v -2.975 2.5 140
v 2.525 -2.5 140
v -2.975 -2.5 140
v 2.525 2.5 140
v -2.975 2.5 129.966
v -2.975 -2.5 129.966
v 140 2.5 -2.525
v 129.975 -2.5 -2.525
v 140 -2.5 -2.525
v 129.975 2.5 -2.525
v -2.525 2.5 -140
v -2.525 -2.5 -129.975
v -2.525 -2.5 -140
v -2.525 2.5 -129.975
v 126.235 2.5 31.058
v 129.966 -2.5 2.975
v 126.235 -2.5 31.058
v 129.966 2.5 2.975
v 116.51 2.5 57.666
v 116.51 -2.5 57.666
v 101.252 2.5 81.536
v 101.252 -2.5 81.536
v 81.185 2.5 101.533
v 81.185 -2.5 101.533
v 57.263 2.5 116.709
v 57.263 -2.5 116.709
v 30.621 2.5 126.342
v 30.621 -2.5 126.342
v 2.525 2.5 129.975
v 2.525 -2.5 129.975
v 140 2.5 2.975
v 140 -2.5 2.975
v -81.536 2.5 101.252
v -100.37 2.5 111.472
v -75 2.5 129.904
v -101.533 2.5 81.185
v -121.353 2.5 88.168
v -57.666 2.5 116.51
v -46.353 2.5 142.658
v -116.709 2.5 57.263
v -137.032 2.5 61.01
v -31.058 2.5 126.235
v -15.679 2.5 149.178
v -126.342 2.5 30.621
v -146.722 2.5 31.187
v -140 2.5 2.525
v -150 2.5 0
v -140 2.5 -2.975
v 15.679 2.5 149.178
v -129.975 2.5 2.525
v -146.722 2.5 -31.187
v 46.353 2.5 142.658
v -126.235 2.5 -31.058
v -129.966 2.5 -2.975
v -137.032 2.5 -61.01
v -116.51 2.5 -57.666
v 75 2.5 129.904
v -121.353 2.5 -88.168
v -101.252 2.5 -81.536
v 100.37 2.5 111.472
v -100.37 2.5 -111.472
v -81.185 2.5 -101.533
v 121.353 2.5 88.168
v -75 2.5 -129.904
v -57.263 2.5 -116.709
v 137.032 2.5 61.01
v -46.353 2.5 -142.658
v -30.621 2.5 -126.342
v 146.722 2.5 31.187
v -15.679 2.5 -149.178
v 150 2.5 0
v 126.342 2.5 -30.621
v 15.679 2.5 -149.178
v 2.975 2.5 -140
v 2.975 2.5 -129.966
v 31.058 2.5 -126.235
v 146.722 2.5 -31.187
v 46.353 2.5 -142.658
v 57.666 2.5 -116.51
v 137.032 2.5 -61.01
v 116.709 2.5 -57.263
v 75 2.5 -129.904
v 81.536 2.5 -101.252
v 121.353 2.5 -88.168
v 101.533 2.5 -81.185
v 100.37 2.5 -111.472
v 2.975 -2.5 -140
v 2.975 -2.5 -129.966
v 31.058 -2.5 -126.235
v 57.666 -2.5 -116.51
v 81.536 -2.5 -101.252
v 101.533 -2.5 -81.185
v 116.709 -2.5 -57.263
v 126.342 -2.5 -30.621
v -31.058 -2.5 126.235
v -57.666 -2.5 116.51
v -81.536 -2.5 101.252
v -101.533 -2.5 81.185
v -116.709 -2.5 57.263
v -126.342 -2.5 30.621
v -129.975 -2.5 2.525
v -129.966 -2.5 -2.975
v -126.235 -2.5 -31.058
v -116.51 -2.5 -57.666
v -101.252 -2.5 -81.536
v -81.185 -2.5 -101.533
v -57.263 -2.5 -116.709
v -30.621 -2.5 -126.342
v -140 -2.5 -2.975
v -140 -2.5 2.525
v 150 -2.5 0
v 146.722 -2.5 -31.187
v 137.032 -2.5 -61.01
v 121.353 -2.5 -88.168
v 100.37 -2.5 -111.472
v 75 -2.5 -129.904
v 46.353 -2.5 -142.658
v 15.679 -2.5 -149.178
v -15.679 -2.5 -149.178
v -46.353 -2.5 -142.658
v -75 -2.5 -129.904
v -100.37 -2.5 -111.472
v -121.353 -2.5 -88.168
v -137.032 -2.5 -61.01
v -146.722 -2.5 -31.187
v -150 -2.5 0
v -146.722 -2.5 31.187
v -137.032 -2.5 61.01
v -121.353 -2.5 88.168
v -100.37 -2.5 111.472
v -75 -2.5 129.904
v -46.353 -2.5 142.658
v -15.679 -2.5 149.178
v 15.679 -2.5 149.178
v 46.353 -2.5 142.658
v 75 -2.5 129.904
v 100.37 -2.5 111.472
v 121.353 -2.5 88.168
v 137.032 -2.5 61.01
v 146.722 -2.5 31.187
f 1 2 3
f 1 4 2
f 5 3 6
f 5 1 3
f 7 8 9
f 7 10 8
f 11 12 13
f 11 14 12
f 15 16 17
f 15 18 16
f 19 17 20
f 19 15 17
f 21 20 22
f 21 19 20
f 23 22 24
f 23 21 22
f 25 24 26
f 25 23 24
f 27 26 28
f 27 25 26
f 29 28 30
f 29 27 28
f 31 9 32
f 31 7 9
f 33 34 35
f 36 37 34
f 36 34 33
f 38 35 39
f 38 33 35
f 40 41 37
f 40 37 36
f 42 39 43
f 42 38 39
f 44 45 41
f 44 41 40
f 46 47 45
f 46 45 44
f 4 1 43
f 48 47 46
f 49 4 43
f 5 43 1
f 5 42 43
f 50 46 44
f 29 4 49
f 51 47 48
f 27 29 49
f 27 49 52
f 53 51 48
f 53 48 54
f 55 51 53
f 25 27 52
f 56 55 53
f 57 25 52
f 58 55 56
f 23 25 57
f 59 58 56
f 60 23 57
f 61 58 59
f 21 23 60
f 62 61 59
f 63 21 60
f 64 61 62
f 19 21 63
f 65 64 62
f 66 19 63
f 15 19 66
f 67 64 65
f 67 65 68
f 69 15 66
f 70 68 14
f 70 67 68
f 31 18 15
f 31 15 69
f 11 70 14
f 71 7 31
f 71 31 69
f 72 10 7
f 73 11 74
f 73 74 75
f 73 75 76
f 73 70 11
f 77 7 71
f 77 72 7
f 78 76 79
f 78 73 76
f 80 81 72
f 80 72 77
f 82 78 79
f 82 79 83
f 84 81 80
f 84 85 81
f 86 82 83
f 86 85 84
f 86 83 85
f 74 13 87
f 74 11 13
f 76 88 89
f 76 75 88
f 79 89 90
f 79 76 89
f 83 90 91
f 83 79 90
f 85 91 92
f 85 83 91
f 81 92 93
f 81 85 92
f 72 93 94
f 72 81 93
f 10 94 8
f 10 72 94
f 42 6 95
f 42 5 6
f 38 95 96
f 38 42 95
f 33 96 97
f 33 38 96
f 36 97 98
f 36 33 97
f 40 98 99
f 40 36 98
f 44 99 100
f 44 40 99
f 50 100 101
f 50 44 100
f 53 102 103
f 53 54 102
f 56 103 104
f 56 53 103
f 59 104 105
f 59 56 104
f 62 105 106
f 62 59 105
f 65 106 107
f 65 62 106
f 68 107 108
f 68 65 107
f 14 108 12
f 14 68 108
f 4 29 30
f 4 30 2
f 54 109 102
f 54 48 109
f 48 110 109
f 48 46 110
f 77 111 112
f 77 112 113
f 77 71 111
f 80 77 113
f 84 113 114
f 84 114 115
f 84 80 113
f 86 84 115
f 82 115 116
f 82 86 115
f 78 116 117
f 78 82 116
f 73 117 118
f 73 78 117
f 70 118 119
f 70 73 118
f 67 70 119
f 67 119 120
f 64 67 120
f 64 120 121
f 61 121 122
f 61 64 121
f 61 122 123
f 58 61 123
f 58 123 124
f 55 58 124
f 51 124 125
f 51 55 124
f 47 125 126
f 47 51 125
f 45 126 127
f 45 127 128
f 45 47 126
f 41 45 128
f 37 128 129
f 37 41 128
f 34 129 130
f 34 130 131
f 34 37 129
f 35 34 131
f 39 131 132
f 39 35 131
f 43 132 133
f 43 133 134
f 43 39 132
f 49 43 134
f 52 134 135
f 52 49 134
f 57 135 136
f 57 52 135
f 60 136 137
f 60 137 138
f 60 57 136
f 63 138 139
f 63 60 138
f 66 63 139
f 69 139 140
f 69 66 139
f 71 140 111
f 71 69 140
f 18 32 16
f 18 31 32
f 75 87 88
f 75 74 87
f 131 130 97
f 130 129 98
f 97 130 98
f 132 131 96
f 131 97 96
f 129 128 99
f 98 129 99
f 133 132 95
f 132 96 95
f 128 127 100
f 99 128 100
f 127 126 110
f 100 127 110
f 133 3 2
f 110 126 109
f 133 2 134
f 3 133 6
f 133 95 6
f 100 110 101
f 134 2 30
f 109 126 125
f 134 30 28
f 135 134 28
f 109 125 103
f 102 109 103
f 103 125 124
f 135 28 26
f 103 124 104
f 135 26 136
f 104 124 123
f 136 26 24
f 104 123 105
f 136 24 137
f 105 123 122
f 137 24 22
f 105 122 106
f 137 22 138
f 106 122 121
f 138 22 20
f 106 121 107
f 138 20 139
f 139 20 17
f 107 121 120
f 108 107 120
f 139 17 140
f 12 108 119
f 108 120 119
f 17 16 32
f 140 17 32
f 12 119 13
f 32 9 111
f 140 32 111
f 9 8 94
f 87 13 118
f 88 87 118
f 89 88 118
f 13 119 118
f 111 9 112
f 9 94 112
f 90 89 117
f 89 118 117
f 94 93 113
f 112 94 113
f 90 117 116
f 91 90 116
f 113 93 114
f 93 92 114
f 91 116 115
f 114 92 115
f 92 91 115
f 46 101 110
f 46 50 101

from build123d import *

# Parameters (mm, degrees)
SKETCH1_R           = 150
BOSS_EXTRUDE1_DEPTH = 2.5


with BuildPart() as part:
    # Sketch1 → Boss-Extrude1 (new body, symmetric)
    with BuildSketch(Plane(origin=(0, 0, 0), x_dir=(1, 0, 0), z_dir=(0, 1, 0))):
        Circle(SKETCH1_R)
        with BuildLine():
            Line((2.525, -129.975476052), (2.525, -140))
            Line((2.525, -140), (-2.975, -140))
            Line((-2.975, -140), (-2.975, -129.965954677))
            ThreePointArc((-2.975, -129.965954677), (-92.082878446, -91.764609176), (-129.975476052, -2.525))
            Line((-129.975476052, -2.525), (-140, -2.525))
            Line((-140, -2.525), (-140, 2.975))
            Line((-140, 2.975), (-129.965954677, 2.975))
            ThreePointArc((-129.965954677, 2.975), (-91.764609176, 92.082878446), (-2.525, 129.975476052))
            Line((-2.525, 129.975476052), (-2.525, 140))
            Line((-2.525, 140), (2.975, 140))
            Line((2.975, 140), (2.975, 129.965954677))
            ThreePointArc((2.975, 129.965954677), (92.082878446, 91.764609176), (129.975476052, 2.525))
            Line((129.975476052, 2.525), (140, 2.525))
            Line((140, 2.525), (140, -2.975))
            Line((140, -2.975), (129.965954677, -2.975))
            ThreePointArc((129.965954677, -2.975), (91.764609176, -92.082878446), (2.525, -129.975476052))
        make_face(mode=Mode.SUBTRACT)
    extrude(amount=BOSS_EXTRUDE1_DEPTH, both=True)


solid = part.part
